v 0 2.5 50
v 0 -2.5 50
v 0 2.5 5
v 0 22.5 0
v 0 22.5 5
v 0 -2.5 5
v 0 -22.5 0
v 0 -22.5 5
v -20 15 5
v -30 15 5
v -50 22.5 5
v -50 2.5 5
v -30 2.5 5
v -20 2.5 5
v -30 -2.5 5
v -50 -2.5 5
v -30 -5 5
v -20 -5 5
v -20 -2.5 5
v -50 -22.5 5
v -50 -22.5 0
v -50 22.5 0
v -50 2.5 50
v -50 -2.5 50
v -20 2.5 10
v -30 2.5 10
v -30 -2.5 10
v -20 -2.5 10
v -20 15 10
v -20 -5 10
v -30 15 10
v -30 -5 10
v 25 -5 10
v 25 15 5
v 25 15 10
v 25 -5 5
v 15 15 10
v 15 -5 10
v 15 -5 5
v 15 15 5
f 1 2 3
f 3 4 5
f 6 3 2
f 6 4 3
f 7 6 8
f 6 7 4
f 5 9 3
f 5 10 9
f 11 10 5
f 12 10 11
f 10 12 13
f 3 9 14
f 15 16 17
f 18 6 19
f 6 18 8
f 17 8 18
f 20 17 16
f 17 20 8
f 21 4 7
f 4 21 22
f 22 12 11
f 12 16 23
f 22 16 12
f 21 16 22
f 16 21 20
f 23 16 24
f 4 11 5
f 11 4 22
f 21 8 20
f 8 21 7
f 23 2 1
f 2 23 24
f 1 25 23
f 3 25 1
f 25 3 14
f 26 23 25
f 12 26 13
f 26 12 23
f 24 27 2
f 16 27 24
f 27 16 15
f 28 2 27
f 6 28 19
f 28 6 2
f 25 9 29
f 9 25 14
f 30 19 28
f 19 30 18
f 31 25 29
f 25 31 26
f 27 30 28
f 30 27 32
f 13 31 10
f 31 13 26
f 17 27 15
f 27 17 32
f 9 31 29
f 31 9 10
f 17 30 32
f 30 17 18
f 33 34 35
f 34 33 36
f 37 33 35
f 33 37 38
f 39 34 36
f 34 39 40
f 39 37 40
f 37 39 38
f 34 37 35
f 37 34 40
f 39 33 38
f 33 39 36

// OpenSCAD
// Built by bench/smallmodels/features/compiler.py from a list of features.
$fn = 64;
difference() {
  union() {
    translate([-25, 0, 0]) translate([-25, -22.5, 0]) cube([50, 45, 5]);
    translate([-25, 0, 0]) translate([-25, -2.5, 0]) cube([50, 5, 50]);
  }
  union() {
    translate([-17, 30, 3.75]) rotate([0, 0, 0]) rotate([0, 90, 0]) cylinder(d = 4.5, h = 1200, center = true);
    translate([17, 30, 3.75]) rotate([0, 0, 0]) rotate([0, 90, 0]) cylinder(d = 4.5, h = 1200, center = true);
  }
}
difference() {
  union() {
    translate([-25, 0, 0]) translate([-25, -2.5, 0]) cube([50, 5, 50]);
  }
  union() {
    translate([0, 2.5, 44.99]) rotate([0, 0, 0]) cylinder(d = 23, h = 5.02);
  }
}
union() {
    translate([-25, 5, 5]) translate([-5, -10, 0]) cube([10, 20, 5]);
  }
union() {
    translate([20, 5, 5]) translate([-5, -10, 0]) cube([10, 20, 5]);
  }
